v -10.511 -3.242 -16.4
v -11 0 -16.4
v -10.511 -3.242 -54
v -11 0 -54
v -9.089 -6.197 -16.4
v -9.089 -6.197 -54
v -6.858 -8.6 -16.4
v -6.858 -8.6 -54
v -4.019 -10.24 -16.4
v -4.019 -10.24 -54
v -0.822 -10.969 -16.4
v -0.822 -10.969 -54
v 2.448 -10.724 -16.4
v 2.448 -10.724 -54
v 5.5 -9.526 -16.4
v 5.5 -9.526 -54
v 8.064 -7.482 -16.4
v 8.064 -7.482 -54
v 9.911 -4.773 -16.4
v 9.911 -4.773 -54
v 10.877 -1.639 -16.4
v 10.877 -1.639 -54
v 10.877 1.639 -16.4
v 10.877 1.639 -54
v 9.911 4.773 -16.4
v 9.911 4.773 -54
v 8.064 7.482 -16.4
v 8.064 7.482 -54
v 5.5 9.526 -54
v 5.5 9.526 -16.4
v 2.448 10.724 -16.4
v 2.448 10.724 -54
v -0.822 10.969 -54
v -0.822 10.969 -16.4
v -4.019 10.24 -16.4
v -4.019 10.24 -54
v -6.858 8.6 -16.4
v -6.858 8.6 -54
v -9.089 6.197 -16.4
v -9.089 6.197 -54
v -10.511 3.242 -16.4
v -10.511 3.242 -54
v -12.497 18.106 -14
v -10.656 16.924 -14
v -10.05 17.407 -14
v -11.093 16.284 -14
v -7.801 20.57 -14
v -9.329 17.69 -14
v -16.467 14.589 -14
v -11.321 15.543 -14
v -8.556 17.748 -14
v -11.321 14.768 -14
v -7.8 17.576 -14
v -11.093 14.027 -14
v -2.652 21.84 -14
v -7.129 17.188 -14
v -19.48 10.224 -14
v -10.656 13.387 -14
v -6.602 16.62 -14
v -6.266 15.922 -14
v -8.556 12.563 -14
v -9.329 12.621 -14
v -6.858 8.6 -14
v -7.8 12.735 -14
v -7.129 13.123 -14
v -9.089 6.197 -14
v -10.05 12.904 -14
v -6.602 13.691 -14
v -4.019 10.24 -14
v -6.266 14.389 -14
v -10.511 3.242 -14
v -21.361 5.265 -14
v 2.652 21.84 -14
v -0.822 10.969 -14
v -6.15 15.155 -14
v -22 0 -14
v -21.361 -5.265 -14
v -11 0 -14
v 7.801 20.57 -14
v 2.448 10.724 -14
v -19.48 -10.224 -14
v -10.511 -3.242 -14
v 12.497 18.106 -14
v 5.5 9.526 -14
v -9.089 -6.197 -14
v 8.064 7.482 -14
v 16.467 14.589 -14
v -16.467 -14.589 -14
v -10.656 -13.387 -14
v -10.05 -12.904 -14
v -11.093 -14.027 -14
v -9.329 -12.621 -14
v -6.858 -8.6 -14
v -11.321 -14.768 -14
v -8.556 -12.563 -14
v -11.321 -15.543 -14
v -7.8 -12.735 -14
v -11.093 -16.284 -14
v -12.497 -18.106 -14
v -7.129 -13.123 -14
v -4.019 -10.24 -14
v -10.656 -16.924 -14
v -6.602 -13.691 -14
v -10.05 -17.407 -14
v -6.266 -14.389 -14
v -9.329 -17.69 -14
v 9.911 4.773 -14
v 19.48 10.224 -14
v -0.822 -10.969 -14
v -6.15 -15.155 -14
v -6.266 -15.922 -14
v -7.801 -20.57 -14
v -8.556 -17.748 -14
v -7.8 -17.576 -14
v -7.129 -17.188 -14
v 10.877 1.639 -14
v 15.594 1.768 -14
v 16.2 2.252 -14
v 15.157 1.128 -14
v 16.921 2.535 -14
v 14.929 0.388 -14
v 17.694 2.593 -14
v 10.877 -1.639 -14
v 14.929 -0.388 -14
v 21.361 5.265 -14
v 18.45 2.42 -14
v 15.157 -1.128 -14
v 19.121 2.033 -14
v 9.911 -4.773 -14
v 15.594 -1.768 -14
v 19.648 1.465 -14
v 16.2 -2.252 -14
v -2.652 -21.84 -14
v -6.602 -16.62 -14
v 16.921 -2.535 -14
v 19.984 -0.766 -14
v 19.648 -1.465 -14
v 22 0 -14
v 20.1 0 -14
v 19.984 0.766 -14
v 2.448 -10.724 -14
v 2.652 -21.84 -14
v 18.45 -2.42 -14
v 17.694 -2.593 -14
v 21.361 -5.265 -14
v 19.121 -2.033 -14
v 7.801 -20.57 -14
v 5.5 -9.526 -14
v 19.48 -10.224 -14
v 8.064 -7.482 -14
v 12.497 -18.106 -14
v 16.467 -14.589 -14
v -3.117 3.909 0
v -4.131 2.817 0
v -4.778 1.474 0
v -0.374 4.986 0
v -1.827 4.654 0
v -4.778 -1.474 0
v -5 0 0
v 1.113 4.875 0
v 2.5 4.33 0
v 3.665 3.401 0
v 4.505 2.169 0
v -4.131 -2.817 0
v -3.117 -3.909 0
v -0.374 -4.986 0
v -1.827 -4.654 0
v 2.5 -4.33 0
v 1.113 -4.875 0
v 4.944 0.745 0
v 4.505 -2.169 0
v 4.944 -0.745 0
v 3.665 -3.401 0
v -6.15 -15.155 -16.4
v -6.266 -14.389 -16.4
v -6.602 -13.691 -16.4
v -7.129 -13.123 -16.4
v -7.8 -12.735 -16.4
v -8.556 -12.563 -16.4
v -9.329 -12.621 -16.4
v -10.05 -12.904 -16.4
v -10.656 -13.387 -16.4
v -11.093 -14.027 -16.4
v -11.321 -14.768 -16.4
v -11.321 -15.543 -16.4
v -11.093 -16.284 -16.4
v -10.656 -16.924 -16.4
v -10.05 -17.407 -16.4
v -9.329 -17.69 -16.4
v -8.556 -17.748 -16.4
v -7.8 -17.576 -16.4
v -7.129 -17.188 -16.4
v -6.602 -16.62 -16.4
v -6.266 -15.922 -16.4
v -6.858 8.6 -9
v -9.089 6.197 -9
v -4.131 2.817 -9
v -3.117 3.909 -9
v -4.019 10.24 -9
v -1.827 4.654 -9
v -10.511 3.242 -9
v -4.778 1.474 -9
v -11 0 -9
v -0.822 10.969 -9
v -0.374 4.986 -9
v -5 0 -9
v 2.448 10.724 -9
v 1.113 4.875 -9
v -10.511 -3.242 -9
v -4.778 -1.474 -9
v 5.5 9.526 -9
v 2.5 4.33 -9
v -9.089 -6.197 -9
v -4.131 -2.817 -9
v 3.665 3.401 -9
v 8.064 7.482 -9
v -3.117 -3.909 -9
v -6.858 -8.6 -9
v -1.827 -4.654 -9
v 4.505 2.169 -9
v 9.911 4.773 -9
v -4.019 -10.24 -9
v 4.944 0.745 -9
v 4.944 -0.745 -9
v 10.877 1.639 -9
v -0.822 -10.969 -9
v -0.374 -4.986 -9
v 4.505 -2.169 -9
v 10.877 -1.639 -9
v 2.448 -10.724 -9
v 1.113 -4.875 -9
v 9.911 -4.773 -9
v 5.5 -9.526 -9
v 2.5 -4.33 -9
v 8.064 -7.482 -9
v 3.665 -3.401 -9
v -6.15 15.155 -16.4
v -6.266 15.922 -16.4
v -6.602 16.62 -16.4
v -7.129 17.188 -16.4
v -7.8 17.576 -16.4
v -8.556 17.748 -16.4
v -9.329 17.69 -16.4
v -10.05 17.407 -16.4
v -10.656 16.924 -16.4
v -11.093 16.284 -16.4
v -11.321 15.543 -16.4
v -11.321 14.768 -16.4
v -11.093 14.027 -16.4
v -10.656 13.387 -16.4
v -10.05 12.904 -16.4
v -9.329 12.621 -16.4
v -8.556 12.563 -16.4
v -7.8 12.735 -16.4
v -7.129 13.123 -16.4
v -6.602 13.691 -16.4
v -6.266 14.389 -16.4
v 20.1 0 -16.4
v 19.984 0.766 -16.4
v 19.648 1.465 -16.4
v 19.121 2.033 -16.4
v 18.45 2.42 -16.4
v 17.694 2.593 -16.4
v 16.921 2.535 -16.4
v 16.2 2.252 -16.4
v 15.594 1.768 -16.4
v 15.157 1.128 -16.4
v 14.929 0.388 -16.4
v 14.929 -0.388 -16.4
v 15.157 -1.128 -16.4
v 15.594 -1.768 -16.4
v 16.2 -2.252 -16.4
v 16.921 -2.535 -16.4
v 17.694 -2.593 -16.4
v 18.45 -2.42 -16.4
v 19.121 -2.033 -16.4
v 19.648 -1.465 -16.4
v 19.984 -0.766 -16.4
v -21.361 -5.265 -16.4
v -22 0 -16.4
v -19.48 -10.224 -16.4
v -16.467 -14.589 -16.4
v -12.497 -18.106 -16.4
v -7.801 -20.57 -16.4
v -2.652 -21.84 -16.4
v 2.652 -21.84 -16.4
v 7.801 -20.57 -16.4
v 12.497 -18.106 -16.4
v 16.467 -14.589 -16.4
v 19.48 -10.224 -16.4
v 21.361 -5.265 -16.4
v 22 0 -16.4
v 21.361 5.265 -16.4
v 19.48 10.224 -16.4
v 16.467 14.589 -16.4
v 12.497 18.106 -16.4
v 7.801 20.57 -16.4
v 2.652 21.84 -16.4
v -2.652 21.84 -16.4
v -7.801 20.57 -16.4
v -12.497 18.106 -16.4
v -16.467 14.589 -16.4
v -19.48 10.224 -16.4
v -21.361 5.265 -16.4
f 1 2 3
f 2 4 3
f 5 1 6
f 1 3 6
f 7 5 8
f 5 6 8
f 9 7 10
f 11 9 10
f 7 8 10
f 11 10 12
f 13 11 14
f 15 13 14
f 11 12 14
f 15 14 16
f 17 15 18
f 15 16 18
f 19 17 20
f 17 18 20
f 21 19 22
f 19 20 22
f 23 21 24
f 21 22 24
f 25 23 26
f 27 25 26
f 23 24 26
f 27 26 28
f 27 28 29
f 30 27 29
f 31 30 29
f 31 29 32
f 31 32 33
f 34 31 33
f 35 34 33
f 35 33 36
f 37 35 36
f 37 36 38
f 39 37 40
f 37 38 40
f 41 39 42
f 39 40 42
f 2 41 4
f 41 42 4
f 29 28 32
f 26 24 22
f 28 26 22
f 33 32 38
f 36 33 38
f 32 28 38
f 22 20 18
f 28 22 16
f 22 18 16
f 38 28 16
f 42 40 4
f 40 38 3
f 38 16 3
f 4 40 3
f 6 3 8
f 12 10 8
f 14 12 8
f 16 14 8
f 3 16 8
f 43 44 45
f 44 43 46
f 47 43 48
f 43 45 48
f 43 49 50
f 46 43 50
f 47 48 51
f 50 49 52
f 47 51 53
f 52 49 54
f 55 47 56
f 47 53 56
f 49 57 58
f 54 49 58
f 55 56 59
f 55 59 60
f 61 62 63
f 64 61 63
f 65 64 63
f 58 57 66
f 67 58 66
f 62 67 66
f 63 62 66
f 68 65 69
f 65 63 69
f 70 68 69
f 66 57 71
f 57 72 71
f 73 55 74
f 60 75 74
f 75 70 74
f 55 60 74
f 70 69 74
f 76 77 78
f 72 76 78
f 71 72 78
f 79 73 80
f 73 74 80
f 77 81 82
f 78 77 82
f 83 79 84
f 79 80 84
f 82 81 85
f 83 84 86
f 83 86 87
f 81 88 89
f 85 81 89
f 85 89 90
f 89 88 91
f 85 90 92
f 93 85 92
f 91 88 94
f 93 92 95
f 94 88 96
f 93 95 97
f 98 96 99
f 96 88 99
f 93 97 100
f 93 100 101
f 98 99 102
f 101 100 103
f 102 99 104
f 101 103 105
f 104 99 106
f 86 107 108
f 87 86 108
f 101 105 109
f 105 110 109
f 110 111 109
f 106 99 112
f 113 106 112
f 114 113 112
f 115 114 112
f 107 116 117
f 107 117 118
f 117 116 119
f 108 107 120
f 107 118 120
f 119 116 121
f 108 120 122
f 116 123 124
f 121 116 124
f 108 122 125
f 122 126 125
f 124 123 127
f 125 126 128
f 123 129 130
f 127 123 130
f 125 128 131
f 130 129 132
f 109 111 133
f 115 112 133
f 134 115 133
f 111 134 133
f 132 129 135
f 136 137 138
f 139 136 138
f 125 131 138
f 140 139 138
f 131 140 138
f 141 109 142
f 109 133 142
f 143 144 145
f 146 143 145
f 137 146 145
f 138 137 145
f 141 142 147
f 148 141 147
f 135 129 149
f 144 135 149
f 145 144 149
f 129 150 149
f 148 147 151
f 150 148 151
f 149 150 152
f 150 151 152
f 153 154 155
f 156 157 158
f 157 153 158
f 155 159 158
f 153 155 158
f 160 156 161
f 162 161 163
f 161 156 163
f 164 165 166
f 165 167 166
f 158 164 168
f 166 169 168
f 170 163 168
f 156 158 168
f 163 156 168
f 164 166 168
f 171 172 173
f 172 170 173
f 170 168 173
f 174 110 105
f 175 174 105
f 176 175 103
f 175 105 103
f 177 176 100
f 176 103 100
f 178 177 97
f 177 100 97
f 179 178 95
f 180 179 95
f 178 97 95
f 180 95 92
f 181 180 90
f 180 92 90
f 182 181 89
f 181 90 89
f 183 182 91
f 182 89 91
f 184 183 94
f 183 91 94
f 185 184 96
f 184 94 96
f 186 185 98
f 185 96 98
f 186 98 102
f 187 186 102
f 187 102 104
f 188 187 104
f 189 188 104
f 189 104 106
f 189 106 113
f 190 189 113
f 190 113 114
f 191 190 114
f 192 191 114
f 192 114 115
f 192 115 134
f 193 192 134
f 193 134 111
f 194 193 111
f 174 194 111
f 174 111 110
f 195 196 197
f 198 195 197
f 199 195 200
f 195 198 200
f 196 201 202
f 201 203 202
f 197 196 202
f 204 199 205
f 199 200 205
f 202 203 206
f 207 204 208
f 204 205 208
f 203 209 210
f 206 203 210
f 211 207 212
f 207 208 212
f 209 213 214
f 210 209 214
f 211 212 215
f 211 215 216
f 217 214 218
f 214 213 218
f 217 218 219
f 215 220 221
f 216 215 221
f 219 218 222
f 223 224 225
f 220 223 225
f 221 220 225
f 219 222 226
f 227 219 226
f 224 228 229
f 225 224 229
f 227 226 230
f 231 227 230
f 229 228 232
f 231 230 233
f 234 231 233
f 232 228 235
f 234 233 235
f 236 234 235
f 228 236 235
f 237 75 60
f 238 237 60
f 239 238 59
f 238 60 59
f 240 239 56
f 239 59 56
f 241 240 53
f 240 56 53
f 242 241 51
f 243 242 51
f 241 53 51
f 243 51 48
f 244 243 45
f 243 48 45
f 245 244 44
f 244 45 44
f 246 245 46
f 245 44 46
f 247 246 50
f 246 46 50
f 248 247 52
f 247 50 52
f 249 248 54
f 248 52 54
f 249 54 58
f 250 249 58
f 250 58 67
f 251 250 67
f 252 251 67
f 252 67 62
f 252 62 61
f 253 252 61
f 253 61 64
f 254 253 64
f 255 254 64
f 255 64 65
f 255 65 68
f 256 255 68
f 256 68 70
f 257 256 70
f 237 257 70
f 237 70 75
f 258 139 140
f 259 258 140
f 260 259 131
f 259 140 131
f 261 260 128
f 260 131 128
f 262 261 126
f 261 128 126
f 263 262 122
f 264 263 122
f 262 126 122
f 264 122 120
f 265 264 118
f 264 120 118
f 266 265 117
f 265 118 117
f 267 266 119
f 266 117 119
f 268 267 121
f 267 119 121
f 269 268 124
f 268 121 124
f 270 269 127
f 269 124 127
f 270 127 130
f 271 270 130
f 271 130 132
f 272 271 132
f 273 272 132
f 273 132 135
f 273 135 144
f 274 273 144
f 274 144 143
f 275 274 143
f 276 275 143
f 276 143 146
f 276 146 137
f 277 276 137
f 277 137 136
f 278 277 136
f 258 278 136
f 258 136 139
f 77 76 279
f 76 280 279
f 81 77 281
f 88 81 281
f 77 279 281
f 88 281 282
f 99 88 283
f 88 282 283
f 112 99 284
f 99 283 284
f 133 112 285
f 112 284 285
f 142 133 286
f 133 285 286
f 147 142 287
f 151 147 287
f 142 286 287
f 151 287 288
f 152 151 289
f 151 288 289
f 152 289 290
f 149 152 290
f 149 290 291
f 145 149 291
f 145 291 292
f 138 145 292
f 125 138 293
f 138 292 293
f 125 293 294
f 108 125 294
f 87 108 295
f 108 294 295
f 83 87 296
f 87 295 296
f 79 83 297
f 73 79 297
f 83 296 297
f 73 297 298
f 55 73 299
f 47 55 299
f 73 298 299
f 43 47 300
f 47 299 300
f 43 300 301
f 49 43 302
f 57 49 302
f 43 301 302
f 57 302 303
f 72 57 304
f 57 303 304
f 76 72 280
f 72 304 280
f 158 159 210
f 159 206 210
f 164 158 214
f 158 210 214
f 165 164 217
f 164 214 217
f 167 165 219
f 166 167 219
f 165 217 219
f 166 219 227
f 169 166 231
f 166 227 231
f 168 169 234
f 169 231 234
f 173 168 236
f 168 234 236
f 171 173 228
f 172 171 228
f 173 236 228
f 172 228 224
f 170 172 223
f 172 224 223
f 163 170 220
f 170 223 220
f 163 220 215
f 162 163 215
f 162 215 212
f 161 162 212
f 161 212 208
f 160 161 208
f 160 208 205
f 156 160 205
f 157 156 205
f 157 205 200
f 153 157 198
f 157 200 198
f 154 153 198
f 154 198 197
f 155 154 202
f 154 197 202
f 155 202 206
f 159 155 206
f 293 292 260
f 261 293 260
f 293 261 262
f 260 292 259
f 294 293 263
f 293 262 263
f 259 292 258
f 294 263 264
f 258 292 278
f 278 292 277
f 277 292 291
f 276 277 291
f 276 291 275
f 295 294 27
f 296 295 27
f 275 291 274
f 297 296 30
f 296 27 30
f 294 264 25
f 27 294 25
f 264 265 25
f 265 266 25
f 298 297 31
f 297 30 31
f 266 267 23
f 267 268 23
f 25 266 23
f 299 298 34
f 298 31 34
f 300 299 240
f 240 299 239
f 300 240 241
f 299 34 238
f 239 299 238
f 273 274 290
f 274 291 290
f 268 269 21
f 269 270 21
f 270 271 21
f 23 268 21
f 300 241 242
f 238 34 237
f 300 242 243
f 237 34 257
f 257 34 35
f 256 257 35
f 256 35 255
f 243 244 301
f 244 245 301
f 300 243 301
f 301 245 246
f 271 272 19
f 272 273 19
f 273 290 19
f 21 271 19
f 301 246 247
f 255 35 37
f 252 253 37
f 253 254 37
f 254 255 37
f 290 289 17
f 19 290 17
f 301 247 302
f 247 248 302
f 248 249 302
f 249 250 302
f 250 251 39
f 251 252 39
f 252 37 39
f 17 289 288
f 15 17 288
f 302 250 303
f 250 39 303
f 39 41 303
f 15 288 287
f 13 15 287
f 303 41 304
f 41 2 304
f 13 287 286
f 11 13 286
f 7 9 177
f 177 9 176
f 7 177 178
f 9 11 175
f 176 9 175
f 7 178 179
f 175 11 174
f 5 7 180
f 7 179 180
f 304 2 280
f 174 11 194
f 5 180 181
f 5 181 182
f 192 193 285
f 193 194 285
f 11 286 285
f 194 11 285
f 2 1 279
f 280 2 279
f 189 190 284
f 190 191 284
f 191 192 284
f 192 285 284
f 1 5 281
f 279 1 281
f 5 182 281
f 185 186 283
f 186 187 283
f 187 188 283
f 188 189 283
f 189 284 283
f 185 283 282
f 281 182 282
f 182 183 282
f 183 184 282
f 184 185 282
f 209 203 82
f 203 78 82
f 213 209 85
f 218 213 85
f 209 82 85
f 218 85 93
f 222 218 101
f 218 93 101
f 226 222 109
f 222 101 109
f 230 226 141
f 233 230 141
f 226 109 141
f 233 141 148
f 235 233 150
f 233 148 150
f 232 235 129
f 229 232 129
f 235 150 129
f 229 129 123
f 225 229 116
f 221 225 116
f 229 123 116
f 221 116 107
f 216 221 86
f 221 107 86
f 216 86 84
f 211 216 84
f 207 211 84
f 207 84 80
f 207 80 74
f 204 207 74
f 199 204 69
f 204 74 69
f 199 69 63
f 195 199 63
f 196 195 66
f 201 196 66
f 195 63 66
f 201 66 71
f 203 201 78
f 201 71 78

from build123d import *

# Parameters (mm, degrees)
SKETCH_2_R          = 2.6
CUT_EXTRUDE_1_DEPTH = 10


with BuildPart() as part:
    # 草图1 → 旋转1 (revolve)
    with BuildSketch(Plane(origin=(0, 0, 0), x_dir=(1, 0, 0), z_dir=(0, 1, 0))):
        Polygon((0, 0), (-5, 0), (-5, 9), (-11, 9), (-11, 14), (-22, 14), (-22, 16.4), (-11, 16.4), (-11, 54), (0, 54), align=None)
    revolve(axis=Axis((0, 0, -54), (0, 0, 1)))

    # 草图2 → 切除-拉伸1 (cut)
    with BuildSketch(Plane.XY.offset(-14)):
        with Locations((17.5, 0)):
            Circle(SKETCH_2_R)
        with Locations((-8.75, -15.155444566)):
            Circle(SKETCH_2_R)
        with Locations((-8.75, 15.155444566)):
            Circle(SKETCH_2_R)
    extrude(amount=-CUT_EXTRUDE_1_DEPTH, mode=Mode.SUBTRACT)


solid = part.part
